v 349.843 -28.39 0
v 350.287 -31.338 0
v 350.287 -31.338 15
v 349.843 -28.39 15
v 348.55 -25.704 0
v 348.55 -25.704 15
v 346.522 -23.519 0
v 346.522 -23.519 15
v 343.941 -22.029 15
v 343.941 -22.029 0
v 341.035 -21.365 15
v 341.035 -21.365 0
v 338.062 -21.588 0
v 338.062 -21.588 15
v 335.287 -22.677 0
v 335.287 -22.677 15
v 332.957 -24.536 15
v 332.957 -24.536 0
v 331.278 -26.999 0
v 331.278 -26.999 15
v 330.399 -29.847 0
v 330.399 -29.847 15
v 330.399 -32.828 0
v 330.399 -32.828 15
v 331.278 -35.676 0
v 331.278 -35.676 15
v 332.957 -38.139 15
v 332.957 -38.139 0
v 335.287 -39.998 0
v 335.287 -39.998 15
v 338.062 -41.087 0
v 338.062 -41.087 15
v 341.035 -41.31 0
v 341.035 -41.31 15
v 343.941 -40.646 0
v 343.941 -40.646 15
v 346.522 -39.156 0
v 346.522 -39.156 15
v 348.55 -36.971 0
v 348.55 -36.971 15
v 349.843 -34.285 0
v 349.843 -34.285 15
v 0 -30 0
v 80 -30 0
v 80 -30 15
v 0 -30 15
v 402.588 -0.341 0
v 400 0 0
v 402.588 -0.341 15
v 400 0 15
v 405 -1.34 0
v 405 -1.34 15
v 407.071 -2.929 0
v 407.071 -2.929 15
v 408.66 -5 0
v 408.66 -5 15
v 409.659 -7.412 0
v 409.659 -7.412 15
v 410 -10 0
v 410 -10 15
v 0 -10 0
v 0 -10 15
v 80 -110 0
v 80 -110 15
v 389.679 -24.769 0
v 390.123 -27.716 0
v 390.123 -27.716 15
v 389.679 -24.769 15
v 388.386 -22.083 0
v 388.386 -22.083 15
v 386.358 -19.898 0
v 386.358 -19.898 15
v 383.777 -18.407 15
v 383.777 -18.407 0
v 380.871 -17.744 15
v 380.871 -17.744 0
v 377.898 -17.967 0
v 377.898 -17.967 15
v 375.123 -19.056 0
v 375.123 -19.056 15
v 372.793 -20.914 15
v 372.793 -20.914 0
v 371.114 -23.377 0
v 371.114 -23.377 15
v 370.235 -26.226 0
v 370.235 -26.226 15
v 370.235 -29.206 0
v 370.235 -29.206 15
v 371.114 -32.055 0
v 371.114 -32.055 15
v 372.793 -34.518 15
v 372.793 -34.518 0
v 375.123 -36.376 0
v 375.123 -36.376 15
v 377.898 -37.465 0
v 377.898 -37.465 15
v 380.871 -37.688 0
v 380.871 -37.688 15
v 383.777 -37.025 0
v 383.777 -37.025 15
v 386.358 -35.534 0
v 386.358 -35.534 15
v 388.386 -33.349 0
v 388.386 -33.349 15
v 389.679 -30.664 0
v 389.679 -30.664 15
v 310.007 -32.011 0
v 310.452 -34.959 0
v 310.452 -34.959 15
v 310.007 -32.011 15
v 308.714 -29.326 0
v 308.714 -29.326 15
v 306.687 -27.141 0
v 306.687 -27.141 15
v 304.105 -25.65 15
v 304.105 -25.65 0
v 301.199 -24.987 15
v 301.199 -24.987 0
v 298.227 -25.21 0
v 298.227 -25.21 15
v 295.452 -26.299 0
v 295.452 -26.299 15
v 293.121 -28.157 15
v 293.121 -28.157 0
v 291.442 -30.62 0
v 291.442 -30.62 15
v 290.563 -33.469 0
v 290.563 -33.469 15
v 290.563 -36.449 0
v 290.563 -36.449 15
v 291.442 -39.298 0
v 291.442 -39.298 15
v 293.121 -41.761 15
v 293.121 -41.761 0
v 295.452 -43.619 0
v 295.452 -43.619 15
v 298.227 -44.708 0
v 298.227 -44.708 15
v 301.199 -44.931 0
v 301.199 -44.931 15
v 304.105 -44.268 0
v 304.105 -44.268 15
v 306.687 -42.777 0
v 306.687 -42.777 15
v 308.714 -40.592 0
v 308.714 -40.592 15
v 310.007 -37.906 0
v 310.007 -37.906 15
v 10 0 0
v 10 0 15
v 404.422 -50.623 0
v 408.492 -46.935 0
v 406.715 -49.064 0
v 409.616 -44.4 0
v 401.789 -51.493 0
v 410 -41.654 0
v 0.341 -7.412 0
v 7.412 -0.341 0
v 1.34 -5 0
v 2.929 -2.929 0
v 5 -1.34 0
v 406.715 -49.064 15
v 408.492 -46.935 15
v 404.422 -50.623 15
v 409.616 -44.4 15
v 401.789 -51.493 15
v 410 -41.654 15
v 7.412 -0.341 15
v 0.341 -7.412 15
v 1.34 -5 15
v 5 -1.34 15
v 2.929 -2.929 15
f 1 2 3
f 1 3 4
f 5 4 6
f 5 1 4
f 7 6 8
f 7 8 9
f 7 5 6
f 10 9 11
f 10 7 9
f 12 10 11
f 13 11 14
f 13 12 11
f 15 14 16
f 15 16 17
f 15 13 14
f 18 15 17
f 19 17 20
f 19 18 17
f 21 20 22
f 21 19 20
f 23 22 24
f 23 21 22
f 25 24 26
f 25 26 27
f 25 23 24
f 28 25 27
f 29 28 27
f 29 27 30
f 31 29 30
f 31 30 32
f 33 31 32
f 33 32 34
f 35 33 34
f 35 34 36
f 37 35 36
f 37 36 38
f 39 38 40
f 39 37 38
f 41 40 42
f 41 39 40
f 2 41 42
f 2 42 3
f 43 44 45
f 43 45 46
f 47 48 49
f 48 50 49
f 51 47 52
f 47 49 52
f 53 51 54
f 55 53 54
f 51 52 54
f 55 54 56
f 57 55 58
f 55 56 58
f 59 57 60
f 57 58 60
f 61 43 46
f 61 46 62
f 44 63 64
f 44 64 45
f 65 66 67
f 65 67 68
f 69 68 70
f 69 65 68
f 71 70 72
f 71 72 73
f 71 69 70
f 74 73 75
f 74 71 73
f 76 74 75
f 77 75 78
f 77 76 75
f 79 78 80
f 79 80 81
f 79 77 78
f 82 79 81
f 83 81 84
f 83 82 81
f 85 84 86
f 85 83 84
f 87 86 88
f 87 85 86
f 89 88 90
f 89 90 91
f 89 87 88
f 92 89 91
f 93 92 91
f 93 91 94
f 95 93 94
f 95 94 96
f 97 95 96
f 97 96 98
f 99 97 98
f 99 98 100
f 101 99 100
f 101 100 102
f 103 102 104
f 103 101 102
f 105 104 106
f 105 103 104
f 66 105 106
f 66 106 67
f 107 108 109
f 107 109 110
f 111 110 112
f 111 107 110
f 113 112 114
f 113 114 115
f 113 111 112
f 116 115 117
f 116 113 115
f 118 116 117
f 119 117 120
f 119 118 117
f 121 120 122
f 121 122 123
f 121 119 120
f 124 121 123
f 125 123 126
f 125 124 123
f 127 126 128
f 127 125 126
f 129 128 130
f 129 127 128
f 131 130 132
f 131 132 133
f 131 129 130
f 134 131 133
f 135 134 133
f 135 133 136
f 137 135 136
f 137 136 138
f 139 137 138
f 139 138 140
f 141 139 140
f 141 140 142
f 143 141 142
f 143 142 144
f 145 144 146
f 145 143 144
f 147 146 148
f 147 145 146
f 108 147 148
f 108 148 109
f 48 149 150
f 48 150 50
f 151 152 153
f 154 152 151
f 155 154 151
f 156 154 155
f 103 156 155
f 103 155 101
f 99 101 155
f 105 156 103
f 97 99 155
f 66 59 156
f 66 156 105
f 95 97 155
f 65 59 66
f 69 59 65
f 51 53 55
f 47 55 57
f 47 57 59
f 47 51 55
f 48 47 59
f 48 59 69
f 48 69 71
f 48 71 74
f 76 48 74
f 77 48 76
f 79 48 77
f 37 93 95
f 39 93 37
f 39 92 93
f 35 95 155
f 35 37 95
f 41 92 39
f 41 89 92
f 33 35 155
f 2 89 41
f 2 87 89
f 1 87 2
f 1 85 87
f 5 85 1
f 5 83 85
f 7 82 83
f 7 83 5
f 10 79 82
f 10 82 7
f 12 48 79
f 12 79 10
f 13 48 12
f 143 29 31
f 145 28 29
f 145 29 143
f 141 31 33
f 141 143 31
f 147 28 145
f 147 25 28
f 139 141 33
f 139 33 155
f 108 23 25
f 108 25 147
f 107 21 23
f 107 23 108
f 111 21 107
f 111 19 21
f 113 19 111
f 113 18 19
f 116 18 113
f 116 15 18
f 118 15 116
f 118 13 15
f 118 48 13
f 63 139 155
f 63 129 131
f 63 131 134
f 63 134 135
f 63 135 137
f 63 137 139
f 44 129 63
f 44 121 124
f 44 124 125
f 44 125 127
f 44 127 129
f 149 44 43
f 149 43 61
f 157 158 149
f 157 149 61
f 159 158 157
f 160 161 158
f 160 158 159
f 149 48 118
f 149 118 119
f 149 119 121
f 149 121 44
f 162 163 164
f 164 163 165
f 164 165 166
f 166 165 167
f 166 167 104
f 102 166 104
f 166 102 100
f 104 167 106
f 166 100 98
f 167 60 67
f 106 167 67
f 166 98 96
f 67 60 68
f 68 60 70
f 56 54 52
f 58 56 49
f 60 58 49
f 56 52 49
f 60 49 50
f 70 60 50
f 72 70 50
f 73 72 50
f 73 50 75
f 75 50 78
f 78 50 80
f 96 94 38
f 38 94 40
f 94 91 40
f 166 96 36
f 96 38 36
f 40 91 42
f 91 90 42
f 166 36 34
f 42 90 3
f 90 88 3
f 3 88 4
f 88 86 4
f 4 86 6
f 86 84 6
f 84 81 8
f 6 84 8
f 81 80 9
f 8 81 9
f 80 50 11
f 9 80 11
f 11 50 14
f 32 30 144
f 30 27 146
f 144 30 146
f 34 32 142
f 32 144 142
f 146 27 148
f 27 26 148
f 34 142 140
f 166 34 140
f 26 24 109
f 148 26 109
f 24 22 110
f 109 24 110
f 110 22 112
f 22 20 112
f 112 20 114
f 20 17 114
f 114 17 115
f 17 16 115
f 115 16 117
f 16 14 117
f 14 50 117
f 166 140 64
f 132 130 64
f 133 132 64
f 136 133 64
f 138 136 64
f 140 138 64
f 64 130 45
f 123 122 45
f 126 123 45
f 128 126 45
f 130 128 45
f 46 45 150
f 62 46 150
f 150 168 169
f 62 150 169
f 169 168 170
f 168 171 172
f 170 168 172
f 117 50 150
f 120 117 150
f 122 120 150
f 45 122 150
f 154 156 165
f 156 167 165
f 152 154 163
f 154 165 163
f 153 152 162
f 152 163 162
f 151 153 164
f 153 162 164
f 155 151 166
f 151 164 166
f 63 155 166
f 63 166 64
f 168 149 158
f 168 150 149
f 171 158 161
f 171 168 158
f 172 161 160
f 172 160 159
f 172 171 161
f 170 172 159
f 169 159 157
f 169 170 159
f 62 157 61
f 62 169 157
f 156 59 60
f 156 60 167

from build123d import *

# Parameters (mm, degrees)
ESQUISSE1_R        = 10
BOSS_EXTRU_1_DEPTH = 15
CONG_1_R           = 10


with BuildPart() as part:
    # Esquisse1 → Boss.-Extru.1 (new body)
    with BuildSketch(Plane.XY):
        Polygon((0, 0), (410, 0), (410, -50), (80, -110), (80, -30), (0, -30), align=None)
        with Locations((300.451747289, -34.958932065)):
            Circle(ESQUISSE1_R, mode=Mode.SUBTRACT)
        with Locations((340.287475547, -31.337502223)):
            Circle(ESQUISSE1_R, mode=Mode.SUBTRACT)
        with Locations((380.123203806, -27.716072381)):
            Circle(ESQUISSE1_R, mode=Mode.SUBTRACT)
    extrude(amount=BOSS_EXTRU_1_DEPTH)

    # Congé1
    cong_1_edges = [part.edges().sort_by_distance(p)[0] for p in [
        (0, 0, 7.5),
        (410, 0, 7.5),
        (410, -50, 7.5),
    ]]
    fillet(cong_1_edges, radius=CONG_1_R)


solid = part.part
